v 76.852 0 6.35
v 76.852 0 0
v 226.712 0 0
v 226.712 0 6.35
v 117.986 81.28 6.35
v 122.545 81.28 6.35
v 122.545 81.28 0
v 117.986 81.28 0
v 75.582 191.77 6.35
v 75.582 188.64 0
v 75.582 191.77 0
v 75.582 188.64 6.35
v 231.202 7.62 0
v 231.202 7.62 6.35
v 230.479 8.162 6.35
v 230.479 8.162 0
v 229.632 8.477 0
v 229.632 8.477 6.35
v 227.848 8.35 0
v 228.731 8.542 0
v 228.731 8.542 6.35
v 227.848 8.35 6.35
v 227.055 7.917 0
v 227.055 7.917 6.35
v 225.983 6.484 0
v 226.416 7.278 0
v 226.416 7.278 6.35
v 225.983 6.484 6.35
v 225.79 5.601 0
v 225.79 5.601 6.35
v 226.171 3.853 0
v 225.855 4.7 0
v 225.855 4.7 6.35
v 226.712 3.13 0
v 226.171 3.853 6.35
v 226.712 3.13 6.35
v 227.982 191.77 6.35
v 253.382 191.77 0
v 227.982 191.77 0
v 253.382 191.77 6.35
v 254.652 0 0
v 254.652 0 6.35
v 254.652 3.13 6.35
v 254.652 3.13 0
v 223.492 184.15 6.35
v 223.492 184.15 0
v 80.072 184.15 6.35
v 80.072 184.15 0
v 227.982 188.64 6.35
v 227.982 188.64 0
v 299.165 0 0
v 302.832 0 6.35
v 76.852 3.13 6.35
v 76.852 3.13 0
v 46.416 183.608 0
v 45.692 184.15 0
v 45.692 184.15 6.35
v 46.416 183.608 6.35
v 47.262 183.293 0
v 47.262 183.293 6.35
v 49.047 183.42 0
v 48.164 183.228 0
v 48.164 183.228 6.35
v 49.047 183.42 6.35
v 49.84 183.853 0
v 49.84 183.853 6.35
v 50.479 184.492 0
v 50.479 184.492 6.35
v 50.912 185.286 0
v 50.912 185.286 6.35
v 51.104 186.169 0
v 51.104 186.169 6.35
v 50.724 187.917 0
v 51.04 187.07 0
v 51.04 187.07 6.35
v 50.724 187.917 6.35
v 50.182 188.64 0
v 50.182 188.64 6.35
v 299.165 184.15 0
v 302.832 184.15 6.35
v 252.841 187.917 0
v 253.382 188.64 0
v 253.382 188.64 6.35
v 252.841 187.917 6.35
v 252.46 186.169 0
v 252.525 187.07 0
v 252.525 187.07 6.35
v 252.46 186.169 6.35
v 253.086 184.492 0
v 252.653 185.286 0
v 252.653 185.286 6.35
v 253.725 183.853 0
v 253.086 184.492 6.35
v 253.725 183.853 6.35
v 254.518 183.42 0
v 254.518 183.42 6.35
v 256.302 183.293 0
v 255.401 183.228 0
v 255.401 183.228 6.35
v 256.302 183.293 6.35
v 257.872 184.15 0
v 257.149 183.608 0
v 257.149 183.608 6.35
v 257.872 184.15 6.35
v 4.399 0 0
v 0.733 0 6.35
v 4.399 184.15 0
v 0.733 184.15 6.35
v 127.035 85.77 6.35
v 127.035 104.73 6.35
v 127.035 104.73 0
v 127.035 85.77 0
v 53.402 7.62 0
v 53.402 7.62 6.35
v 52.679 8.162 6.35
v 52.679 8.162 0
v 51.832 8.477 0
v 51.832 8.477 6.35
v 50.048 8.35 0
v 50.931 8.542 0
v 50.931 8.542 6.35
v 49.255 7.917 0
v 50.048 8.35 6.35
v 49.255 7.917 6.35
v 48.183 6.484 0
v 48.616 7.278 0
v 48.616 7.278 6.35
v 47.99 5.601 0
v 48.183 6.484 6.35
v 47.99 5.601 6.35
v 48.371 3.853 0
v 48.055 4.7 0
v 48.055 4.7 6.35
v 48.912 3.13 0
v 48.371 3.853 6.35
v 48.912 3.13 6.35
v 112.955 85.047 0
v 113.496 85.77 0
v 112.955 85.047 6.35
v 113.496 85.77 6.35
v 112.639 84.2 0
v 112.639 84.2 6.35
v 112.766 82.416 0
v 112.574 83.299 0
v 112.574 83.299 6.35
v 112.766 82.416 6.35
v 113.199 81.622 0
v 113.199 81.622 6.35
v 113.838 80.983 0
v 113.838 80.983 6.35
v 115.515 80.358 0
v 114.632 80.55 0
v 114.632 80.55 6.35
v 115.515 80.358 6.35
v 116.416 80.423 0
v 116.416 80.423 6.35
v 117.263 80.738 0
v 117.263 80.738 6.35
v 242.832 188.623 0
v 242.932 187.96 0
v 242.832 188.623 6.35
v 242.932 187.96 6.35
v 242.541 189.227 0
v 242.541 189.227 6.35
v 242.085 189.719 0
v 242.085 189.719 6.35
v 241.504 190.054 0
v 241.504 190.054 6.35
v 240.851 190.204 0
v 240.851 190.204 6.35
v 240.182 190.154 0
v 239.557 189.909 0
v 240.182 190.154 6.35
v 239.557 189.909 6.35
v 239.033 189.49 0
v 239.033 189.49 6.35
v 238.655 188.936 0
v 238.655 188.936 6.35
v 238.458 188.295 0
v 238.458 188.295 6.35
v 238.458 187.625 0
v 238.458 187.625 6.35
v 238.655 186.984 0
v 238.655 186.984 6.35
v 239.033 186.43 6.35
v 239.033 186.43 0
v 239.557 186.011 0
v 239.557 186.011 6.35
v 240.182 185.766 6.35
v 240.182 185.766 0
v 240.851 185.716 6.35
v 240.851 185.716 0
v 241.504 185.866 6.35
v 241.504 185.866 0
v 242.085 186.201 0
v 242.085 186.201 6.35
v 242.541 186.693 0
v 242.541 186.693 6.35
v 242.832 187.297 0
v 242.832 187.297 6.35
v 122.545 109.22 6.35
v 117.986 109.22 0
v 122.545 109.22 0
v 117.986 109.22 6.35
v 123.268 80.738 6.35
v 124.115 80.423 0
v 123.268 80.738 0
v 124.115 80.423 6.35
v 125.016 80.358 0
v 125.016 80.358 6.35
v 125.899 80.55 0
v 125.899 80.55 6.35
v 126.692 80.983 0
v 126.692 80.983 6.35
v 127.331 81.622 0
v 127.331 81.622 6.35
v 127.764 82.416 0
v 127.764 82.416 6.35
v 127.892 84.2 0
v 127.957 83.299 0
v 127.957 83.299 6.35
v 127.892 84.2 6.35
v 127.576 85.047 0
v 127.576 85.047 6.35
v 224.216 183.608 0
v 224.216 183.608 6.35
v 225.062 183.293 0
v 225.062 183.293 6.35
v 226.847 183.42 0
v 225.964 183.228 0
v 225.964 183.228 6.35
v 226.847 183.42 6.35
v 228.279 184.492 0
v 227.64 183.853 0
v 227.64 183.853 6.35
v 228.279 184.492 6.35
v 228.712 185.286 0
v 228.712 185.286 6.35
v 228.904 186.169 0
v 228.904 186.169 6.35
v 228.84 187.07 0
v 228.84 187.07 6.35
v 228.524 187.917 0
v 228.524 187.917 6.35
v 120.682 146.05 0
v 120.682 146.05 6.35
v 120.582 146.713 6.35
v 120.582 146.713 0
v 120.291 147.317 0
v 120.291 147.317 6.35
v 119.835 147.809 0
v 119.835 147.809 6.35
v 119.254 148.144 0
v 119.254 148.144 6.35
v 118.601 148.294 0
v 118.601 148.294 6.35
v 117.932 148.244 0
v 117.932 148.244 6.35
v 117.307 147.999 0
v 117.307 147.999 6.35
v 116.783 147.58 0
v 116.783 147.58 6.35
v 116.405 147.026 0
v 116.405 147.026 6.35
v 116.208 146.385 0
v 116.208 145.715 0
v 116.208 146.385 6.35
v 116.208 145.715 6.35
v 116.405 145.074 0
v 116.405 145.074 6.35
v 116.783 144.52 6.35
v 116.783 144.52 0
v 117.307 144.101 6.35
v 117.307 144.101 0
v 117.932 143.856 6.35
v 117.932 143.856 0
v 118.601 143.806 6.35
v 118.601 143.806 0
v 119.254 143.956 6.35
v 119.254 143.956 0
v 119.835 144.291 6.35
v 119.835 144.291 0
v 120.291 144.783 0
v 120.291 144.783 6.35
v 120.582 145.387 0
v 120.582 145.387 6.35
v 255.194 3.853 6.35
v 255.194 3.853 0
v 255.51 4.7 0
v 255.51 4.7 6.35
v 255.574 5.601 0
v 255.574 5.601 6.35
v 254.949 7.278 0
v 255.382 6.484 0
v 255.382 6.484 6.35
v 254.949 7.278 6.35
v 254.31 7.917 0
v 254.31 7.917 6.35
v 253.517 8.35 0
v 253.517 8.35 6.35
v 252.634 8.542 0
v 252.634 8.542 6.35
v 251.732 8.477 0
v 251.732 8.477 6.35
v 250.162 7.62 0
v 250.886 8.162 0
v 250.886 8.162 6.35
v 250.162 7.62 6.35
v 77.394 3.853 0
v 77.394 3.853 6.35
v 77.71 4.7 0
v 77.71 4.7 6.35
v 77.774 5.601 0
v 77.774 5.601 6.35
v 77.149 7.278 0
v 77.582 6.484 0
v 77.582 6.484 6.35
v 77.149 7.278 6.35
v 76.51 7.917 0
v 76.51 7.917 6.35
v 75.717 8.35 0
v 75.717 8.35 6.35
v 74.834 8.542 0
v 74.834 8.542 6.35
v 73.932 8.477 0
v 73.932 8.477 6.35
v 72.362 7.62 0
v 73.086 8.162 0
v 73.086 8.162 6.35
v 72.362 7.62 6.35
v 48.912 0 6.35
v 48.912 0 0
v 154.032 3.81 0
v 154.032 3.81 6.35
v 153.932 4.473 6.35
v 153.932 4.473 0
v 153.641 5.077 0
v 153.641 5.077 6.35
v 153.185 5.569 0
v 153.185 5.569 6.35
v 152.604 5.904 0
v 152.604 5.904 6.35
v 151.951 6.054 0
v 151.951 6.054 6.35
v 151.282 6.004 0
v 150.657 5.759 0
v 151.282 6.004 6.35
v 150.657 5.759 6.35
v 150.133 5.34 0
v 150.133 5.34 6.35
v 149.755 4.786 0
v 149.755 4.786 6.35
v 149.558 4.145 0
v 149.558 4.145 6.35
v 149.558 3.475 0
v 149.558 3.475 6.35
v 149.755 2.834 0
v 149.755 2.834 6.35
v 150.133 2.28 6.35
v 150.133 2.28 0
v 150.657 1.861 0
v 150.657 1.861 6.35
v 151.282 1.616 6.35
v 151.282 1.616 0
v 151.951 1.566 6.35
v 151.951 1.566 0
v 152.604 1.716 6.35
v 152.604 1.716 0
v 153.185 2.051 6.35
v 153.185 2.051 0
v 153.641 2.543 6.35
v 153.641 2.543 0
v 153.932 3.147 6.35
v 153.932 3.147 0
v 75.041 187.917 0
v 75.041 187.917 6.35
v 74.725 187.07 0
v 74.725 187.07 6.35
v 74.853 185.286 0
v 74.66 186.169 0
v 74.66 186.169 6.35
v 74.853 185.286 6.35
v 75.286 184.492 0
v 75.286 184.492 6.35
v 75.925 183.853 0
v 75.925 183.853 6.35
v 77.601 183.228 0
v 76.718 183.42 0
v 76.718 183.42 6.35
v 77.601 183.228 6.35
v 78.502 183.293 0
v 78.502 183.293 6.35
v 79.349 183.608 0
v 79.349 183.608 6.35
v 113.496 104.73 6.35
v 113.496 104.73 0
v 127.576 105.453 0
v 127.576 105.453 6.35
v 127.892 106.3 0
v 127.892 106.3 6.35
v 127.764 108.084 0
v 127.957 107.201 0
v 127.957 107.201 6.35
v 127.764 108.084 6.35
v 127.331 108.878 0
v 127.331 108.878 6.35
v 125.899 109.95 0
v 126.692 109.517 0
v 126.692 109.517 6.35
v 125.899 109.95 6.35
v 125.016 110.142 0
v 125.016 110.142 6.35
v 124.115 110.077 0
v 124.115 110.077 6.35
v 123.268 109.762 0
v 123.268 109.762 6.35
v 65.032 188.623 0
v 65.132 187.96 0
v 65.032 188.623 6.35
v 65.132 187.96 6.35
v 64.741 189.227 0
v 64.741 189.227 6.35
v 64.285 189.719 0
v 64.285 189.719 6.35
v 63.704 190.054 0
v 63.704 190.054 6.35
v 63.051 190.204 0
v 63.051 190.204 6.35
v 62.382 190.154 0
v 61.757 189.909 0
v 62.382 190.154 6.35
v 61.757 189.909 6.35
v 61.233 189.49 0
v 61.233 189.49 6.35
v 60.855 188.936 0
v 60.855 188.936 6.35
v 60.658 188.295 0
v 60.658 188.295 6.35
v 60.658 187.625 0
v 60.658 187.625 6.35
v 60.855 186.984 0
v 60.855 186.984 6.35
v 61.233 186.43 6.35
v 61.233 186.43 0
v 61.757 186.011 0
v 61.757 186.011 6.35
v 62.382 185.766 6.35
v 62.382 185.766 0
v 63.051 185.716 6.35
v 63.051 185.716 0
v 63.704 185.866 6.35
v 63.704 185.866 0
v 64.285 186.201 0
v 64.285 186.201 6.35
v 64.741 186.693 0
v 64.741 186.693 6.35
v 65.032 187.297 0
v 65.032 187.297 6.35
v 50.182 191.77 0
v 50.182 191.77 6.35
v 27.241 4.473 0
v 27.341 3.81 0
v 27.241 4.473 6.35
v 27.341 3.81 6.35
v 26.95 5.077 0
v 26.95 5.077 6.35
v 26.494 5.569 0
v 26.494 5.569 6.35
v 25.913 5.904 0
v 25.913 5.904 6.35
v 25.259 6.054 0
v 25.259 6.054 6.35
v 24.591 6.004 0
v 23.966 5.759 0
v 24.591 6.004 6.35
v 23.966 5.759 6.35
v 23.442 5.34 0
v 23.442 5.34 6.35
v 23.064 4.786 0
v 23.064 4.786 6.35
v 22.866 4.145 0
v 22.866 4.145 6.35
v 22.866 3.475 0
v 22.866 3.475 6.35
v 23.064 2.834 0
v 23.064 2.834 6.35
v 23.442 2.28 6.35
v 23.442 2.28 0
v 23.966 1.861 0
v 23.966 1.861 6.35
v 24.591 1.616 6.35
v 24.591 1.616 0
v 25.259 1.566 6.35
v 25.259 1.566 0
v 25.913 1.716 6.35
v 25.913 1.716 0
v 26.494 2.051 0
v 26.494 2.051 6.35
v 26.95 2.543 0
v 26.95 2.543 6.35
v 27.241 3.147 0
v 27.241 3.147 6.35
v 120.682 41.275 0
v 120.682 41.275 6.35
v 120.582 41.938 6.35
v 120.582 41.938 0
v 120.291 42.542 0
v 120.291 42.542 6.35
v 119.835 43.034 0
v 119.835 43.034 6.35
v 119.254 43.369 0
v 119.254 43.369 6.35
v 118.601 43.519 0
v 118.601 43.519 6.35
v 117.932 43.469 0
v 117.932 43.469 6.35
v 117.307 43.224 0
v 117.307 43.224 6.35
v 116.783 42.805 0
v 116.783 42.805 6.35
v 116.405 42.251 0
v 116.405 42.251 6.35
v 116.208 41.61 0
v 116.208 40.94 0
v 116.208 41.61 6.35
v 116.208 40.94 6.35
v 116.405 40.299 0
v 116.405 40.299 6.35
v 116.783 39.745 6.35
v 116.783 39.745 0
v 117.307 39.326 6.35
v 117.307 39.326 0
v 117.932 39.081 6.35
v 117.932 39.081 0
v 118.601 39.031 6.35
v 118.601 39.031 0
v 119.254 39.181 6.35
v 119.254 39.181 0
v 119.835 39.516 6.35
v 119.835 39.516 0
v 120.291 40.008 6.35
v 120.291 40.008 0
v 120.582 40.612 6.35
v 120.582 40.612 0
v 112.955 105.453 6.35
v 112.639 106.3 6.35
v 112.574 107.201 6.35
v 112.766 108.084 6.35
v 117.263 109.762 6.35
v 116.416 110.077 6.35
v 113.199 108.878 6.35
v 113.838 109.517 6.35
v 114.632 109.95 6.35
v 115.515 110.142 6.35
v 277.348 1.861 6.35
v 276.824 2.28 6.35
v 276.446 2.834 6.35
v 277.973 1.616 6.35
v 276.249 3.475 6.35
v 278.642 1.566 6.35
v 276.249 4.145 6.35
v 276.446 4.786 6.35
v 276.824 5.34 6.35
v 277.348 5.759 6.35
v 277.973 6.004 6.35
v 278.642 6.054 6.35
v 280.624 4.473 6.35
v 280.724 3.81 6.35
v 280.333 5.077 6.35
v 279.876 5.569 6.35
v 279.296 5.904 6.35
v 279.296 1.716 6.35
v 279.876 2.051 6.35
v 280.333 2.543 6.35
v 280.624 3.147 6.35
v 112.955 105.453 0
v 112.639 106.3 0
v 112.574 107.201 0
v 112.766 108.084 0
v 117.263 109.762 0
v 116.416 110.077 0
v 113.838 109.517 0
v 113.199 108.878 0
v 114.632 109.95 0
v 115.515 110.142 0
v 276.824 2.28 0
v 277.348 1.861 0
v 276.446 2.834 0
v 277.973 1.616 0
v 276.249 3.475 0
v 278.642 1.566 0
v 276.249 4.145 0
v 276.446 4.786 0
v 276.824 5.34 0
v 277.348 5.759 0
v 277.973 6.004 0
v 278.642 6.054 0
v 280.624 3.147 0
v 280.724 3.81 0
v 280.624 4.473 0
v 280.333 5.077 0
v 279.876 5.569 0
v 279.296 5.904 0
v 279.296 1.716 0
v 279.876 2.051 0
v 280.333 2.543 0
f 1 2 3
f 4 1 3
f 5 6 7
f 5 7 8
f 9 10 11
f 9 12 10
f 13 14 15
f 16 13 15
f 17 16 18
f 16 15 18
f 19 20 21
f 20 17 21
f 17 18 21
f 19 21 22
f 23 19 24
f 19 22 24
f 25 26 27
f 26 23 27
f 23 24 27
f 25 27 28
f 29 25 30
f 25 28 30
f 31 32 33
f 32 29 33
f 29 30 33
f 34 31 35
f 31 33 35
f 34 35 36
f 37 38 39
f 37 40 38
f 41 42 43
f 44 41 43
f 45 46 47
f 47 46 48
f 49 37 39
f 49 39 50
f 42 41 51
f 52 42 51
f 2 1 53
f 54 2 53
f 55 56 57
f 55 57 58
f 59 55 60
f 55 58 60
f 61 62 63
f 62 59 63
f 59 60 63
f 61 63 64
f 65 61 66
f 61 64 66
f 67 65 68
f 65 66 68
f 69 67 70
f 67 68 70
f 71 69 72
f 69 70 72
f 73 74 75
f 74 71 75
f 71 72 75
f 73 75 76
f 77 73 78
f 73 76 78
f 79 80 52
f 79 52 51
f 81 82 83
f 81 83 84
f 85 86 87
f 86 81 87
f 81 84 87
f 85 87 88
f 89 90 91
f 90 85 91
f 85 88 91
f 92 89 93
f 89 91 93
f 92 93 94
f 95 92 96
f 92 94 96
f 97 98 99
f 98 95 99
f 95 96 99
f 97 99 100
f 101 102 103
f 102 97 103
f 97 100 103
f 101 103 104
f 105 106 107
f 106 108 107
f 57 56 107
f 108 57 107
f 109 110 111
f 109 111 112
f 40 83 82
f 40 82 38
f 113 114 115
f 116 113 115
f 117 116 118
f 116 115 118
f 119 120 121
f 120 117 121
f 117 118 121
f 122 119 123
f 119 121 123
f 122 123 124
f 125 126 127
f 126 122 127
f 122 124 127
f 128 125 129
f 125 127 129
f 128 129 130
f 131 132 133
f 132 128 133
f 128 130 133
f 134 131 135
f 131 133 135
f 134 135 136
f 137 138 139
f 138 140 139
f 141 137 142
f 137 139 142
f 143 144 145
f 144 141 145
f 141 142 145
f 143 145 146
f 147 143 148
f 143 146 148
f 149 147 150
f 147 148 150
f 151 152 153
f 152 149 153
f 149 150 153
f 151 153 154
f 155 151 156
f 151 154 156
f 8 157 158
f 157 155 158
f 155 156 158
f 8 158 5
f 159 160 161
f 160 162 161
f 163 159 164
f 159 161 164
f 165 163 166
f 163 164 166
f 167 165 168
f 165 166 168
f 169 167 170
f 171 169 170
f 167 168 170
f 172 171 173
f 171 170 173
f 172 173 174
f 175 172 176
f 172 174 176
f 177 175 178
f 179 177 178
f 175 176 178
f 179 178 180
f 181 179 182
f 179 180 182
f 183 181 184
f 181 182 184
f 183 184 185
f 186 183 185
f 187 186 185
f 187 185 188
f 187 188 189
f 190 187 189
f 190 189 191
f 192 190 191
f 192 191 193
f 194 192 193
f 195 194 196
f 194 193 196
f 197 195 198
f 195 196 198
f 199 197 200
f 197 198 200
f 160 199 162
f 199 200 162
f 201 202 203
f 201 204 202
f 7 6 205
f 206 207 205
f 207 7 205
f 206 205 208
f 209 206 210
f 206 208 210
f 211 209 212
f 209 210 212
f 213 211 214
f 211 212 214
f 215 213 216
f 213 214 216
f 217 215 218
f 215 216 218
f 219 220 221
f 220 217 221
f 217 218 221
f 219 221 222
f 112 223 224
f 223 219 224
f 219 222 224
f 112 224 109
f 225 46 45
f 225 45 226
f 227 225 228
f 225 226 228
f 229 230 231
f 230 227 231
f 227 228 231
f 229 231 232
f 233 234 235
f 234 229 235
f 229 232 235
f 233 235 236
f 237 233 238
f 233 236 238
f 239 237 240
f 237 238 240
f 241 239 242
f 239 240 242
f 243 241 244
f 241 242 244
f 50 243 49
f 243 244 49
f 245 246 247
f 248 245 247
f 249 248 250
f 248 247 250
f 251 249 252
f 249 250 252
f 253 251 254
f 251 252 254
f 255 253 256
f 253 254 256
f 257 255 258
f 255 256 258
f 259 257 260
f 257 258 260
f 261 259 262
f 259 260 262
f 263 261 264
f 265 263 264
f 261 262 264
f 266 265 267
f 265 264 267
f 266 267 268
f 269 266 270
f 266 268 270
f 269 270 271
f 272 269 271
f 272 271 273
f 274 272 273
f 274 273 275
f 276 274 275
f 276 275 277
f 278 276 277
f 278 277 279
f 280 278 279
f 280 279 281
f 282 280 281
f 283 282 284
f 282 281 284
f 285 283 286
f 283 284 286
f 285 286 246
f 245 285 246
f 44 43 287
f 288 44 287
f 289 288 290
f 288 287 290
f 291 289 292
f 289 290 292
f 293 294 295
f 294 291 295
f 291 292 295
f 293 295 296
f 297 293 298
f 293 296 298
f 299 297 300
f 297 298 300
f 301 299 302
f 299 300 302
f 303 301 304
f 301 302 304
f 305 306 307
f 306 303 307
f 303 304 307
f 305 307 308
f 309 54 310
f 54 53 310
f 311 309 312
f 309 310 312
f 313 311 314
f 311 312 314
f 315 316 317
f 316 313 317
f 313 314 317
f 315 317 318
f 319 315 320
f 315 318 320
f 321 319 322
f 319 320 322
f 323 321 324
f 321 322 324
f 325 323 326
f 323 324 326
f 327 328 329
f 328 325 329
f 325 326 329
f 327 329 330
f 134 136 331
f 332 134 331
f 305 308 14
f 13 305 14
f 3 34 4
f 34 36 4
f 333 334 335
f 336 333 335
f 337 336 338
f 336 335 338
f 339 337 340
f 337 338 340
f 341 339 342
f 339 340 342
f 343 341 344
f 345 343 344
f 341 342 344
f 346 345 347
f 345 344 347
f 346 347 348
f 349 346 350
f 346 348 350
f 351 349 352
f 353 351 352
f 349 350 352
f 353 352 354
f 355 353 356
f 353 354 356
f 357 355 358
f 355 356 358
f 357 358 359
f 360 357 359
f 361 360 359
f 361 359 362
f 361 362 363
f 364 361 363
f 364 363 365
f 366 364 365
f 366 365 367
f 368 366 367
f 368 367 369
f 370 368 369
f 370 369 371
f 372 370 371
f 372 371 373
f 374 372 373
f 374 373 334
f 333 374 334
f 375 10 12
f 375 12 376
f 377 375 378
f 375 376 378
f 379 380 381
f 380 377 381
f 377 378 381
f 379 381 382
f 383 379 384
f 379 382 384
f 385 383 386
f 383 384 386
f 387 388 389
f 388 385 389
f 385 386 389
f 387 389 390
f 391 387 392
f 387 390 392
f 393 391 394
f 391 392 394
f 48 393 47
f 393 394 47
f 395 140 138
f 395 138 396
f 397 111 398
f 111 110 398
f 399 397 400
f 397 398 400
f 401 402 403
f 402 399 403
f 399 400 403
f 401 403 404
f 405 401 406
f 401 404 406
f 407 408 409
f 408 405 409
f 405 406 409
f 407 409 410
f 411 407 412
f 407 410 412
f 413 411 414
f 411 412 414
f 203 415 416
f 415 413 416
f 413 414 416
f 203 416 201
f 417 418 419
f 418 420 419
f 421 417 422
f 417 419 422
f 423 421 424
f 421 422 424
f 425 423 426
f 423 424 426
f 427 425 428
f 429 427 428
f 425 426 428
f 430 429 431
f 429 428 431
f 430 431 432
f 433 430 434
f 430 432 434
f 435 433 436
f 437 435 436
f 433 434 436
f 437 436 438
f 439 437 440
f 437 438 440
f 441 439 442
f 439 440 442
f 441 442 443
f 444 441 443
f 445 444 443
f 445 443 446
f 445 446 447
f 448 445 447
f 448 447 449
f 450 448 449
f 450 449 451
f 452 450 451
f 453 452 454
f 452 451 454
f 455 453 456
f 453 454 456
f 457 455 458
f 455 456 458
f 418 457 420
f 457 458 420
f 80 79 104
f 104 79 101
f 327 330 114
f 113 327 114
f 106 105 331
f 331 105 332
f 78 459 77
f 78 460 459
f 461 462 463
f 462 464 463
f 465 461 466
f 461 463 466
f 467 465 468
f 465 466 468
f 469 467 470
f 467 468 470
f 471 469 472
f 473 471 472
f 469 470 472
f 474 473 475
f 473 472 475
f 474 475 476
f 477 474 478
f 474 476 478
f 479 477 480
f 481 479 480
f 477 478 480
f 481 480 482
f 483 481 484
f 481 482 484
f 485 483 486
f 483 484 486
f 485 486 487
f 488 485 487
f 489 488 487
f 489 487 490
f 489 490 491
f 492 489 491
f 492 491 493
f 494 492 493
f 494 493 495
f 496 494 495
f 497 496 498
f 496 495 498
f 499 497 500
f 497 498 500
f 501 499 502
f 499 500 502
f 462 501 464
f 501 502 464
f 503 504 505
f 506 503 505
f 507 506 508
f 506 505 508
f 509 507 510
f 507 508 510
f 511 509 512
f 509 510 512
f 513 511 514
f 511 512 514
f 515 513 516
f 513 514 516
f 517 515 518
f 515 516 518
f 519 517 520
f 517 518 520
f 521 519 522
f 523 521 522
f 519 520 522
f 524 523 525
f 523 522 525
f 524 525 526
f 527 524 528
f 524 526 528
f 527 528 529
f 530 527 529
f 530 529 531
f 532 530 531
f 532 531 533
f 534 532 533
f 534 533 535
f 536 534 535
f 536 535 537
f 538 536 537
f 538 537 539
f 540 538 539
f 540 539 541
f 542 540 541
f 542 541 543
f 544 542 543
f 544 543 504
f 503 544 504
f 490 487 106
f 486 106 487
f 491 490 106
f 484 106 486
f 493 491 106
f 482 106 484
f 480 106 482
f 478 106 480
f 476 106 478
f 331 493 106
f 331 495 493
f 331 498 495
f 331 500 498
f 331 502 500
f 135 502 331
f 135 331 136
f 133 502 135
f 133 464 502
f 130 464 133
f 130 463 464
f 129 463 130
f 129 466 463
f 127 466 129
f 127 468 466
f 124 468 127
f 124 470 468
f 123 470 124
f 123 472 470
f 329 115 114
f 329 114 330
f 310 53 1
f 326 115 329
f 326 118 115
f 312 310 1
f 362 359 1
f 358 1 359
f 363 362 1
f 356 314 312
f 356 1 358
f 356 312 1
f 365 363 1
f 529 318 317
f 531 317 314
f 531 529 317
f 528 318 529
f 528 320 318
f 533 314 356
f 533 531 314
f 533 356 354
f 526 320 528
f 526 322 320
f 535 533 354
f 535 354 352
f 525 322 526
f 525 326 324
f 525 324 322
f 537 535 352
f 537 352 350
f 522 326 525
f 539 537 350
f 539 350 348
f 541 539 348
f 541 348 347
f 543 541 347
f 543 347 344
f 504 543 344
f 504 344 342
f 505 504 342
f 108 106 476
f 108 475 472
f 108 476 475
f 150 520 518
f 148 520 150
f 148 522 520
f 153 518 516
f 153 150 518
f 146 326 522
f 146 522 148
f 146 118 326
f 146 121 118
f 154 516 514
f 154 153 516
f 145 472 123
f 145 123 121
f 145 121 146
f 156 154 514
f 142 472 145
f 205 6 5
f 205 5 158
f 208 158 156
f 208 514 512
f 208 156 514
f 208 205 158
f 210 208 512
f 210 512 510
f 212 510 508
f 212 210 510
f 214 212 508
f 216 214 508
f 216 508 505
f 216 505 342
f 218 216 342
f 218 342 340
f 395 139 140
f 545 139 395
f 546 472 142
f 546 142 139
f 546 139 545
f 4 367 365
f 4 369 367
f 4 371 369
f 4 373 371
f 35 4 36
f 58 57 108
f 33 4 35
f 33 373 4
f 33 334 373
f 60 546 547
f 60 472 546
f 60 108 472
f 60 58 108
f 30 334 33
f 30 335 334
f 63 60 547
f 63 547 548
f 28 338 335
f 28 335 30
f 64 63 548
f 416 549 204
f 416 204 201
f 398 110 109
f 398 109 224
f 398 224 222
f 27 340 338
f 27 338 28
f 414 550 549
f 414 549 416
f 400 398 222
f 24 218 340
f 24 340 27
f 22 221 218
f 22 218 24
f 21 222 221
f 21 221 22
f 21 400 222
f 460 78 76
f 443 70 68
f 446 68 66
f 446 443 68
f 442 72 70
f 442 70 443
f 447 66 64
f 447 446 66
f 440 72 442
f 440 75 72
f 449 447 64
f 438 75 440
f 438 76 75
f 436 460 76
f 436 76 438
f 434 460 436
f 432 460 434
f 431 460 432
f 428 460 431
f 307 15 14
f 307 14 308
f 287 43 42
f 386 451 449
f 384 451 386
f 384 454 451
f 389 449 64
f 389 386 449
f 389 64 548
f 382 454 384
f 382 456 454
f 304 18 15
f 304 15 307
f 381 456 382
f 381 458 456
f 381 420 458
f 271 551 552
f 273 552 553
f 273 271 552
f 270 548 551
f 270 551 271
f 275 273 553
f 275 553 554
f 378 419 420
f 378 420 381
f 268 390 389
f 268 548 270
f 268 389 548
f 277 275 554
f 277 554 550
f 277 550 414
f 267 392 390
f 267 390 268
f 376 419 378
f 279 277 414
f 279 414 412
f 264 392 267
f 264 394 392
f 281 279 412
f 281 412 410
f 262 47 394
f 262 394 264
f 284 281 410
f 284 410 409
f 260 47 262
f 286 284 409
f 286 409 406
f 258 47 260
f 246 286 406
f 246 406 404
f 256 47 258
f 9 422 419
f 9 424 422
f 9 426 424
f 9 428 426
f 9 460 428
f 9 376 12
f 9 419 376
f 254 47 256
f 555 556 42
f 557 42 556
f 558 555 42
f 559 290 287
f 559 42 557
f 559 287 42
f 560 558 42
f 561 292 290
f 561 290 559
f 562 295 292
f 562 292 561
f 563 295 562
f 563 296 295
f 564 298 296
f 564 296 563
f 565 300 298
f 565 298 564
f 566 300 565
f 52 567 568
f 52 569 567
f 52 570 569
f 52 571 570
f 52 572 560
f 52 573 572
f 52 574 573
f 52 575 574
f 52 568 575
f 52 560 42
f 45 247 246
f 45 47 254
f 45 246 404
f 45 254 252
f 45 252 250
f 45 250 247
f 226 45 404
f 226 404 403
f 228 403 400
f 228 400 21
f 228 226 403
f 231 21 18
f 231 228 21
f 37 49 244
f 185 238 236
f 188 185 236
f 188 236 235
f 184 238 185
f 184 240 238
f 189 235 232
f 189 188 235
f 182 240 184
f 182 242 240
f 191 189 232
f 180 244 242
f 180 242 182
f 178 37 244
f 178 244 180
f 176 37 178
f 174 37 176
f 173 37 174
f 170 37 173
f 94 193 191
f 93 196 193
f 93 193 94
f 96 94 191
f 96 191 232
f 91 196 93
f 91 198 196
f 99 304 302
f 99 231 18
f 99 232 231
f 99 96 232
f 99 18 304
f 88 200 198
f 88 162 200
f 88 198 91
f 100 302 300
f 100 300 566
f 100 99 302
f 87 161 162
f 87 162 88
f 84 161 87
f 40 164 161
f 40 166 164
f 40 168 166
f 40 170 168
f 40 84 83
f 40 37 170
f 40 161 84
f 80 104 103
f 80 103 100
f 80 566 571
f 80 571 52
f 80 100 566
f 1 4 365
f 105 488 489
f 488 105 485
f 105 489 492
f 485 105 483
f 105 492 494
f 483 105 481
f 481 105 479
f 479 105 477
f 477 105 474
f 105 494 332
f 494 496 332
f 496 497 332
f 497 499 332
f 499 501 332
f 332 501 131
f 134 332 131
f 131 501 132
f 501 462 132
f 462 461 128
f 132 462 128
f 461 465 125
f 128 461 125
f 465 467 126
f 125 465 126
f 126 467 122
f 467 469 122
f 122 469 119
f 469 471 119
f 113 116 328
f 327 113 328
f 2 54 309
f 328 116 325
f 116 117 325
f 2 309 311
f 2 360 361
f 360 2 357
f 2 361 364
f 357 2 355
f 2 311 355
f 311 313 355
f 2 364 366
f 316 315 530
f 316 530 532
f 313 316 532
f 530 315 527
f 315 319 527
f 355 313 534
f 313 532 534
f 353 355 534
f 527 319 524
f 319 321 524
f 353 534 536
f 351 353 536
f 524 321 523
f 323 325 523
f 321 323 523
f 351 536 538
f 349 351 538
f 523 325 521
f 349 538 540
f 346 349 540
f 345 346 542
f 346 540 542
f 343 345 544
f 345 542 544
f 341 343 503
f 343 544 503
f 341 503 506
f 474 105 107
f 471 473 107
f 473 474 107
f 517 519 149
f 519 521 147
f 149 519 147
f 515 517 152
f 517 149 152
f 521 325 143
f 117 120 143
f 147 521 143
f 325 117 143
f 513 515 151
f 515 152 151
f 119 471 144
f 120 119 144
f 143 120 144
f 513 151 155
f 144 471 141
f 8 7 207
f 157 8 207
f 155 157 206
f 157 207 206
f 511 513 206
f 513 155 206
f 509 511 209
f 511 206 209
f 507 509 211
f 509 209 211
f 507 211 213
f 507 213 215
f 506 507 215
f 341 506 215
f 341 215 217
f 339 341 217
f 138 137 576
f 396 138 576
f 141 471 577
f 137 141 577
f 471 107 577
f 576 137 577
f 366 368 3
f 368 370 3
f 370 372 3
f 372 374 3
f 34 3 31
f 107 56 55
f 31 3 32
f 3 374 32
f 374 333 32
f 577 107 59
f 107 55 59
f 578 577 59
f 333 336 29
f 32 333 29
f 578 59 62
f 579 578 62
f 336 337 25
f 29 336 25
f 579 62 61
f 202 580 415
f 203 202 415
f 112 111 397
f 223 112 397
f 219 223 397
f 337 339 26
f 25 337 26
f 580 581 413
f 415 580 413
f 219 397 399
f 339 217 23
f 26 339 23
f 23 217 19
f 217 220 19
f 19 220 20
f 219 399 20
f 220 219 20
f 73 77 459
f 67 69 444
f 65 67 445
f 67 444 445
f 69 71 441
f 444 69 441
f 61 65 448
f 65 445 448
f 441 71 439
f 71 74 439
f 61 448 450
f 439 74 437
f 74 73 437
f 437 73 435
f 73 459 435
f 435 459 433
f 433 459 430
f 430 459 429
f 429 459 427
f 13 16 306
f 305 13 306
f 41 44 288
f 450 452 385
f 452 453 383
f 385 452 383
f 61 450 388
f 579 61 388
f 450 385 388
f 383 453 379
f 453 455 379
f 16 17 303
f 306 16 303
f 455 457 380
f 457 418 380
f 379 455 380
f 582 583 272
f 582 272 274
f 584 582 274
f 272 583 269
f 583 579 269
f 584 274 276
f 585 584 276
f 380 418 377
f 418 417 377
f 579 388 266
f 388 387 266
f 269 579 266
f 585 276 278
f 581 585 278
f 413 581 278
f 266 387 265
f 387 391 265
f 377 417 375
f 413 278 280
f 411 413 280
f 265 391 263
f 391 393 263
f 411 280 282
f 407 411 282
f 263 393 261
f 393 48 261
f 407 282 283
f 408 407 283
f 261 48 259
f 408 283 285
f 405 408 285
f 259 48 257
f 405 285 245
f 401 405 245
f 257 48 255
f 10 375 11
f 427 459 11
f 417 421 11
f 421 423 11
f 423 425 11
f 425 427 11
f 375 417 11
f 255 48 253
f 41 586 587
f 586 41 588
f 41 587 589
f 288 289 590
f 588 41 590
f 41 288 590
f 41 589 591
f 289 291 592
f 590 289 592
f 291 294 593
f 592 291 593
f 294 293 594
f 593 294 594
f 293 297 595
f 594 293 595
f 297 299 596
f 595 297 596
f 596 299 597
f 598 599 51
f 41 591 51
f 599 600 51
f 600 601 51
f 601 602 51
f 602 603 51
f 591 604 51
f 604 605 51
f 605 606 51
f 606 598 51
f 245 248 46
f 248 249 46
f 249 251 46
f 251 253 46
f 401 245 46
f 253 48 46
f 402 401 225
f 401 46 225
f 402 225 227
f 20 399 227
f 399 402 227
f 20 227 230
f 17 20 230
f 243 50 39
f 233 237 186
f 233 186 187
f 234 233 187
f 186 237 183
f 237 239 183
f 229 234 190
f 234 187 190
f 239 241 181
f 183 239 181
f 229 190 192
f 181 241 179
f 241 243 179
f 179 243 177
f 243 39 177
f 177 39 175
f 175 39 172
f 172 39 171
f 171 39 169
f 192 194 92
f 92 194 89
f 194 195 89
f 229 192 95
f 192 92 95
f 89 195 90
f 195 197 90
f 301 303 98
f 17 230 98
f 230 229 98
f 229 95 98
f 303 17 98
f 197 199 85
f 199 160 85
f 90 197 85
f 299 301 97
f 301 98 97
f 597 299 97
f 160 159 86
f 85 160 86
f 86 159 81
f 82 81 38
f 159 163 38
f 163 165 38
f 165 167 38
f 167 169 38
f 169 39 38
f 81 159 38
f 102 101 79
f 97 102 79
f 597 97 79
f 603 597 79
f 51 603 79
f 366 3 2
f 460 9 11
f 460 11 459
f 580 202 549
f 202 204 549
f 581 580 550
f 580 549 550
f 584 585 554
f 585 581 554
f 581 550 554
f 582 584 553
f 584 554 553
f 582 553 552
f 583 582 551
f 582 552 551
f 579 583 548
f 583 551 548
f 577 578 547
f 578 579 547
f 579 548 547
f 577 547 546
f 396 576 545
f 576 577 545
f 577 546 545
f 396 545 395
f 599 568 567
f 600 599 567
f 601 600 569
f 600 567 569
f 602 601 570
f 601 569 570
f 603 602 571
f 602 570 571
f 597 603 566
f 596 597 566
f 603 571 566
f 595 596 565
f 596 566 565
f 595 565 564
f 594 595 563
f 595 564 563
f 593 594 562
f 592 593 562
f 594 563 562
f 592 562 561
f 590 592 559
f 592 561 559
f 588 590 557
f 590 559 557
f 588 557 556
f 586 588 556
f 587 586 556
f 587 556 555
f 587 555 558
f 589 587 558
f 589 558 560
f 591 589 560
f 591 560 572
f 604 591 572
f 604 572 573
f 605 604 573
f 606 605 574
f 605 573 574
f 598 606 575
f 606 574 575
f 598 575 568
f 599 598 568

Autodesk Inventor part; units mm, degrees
ref_plane "YZ Plane" through (0, 0, 0) normal (1, 0, 0) x (0, 1, 0)
sketch "Sketch1" plane through (0, 0, 0) normal (0, 0, 1) x (1, 0, 0)
  line L0 (0, 0) -> (303.5647, 0)
  line L1 (303.5647, 0) -> (303.5647, 184.15)
  line L2 (303.5647, 184.15) -> (0, 184.15)
  line L3 (0, 184.15) -> (0, 0)
  dimension "d0" = 303.5647
  dimension "d1" = 184.15
extrude "Extrusion1" add sketch "Sketch1" along normal blind 6.35
sketch "Sketch2" plane through (0, 184.15, 0) normal (0, 1, 0) x (1, 0, 0)
  line L0 (0, -6.35) -> (303.5647, -6.35) projected
  line L1 (0, -6.35) -> (3.6662, 0)
  line L2 (3.6662, 0) -> (0, 0)
  line L3 (0, 0) -> (0, -6.35)
  line L4 (0, 0) -> (303.5647, 0) projected
  line L5 (303.5647, 0) -> (303.5647, -6.35) projected
  line L6 (299.8985, 0) -> (303.5647, -6.35)
  line L7 (303.5647, -6.35) -> (303.5647, 0)
  line L8 (303.5647, 0) -> (299.8985, 0)
  dimension "d4" = 30
  dimension "d5" = 30
extrude "Extrusion2" cut sketch "Sketch2" against normal through all contours L3 L2 L1 | L6 L4 L5
ref_plane "Work Plane1" through (3.6662, 92.075, 0) normal (0, -1, 0) x (1, 0, 0)
sketch "Sketch4" plane through (3.6662, 92.075, 0) normal (0, -1, 0) x (1, 0, 0)
  line L0 (0, 0) -> (296.2324, 0) projected
  line L1 (118.4324, 0) -> (129.4309, 6.35) construction
  line L2 (129.4309, 6.35) -> (116.7309, 6.35) construction
  line L3 (-3.6662, 6.35) -> (299.8985, 6.35) projected
  line L4 (118.4324, 0) -> (111.1, 0)
  line L5 (118.0728, 4.0257) -> (111.1, 0) construction
  line L6 (-3.6662, 6.35) -> (0, 0) projected
  line L7 (118.4324, 0) -> (122.0985, 6.35)
  line L8 (111.1, 0) -> (114.7662, 6.35)
  line L9 (122.0985, 6.35) -> (114.7662, 6.35)
  point P0 (-3.6662, 0)
  dimension "d13" = 88.9
  dimension "d14" = 30
  dimension "d15" = 60
  dimension "d16" = 6.35
extrude "Extrusion3" cut sketch "Sketch4" along normal blind 9.525 and the other way blind 15.875 contours L8 L3 L7 L0
sketch "Sketch5" plane through (0, 0, 6.35) normal (0, 0, 1) x (1, 0, 0)
  line L0 (3.6662, 0) -> (299.8985, 0) projected
  line L1 (50.1824, 0) -> (75.5824, 0)
  line L2 (75.5824, 0) -> (75.5824, 7.62)
  line L3 (75.5824, 7.62) -> (50.1824, 7.62)
  line L4 (50.1824, 7.62) -> (50.1824, 0)
  line L5 (227.9824, 0) -> (253.3824, 0)
  line L6 (253.3824, 0) -> (253.3824, 7.62)
  line L7 (253.3824, 7.62) -> (227.9824, 7.62)
  line L8 (227.9824, 7.62) -> (227.9824, 0)
  line L9 (75.5824, 7.62) -> (227.9824, 7.62) construction
  point P0 (0, 0)
  point P1 (151.7824, 7.62)
  point P2 (151.7824, 0)
  dimension "d19" = 25.4
  dimension "d20" = 7.62
  dimension "d21" = 25.4
  dimension "d22" = 7.62
  dimension "d23" = 152.4
extrude "Extrusion4" cut sketch "Sketch5" against normal through all
sketch "Sketch6" plane through (0, 0, 6.35) normal (0, 0, 1) x (1, 0, 0)
  line L0 (299.8985, 184.15) -> (3.6662, 184.15) projected
  line L1 (50.1824, 184.15) -> (75.5824, 184.15)
  line L2 (75.5824, 184.15) -> (75.5824, 191.77)
  line L3 (75.5824, 191.77) -> (50.1824, 191.77)
  line L4 (50.1824, 191.77) -> (50.1824, 184.15)
  line L5 (50.1824, 7.62) -> (75.5824, 7.62) projected
  line L6 (227.9824, 184.15) -> (253.3824, 184.15)
  line L7 (253.3824, 184.15) -> (253.3824, 191.77)
  line L8 (253.3824, 191.77) -> (227.9824, 191.77)
  line L9 (227.9824, 191.77) -> (227.9824, 184.15)
  line L10 (227.9824, 7.62) -> (253.3824, 7.62) projected
  point P0 (0, 0)
  point P1 (62.8824, 191.77)
  point P2 (62.8824, 7.62)
  point P3 (240.6824, 191.77)
  point P4 (240.6824, 7.62)
  dimension "d26" = 25.4
  dimension "d27" = 7.62
  dimension "d28" = 25.4
  dimension "d29" = 7.62
extrude "Extrusion5" add sketch "Sketch6" against normal blind 6.35
ref_plane "Work Plane2" through (125.7647, 92.075, 6.35) normal (-0.5, 0, -0.8660254) x (0, -1, 0)
sketch "Sketch7" plane through (125.7647, 92.075, 6.35) normal (-0.5, 0, -0.8660254) x (0, -1, 0)
  line L0 (-15.875, 6.35) -> (-15.875, 0) projected
  line L1 (-15.875, 3.175) -> (-92.075, 3.175) construction
  line L2 (-92.075, -88.5231) -> (-92.075, 43.4592) projected
  line L3 (9.525, 0) -> (9.525, 6.35) projected
  line L4 (9.525, 3.175) -> (92.075, 3.175) construction
  line L5 (92.075, 43.4592) -> (92.075, -88.5231) projected
  circle A0 centre (-53.975, 3.175) radius 2.25
  circle A1 centre (50.8, 3.175) radius 2.25
  point P0 (92.075, 105.7404)
  dimension "d33" = 4.5
  dimension "d34" = 4.5
extrude "Extrusion6" cut sketch "Sketch7" along normal through all
sketch "Sketch8" plane through (0, 0, 6.35) normal (0, 0, 1) x (1, 0, 0)
  circle A0 centre (62.8824, 187.96) radius 2.25
  circle A1 centre (240.6824, 187.96) radius 2.25
  circle A2 centre (278.4735, 3.81) radius 2.25
  circle A3 centre (151.7824, 3.81) radius 2.25
  circle A4 centre (25.0912, 3.81) radius 2.25
  line L0 (0, 0) -> (50.1824, 0) projected
  line L1 (75.5824, 0) -> (227.9824, 0) projected
  line L2 (253.3824, 0) -> (303.5647, 0) projected
  line L3 (50.1824, 0) -> (50.1824, 7.62) projected
  line L4 (253.3824, 184.15) -> (253.3824, 191.77) projected
  line L5 (75.5824, 191.77) -> (50.1824, 191.77) projected
  line L6 (253.3824, 191.77) -> (227.9824, 191.77) projected
  point P0 (25.0912, 0)
  point P1 (151.7824, 0)
  point P2 (278.4735, 0)
  point P3 (50.1824, 3.81)
  point P4 (253.3824, 187.96)
  point P5 (62.8824, 191.77)
  point P6 (240.6824, 191.77)
  dimension "d37" = 4.5
  dimension "d38" = 4.5
  dimension "d39" = 4.5
  dimension "d40" = 4.5
  dimension "d41" = 4.5
extrude "Extrusion7" cut sketch "Sketch8" against normal through all
sketch "Sketch9" plane through (0, 0, 0) normal (0, 0, -1) x (-1, 0, 0)
  ellipse E0 centre (-118.4324, 41.275) end of major axis (-121.0304, 41.275) minor radius 2.25 projected
  line L0 (-114.7662, 107.95) -> (-114.7662, 82.55) projected
  line L1 (-114.7662, 107.95) -> (-118.4324, 107.95) projected
  line L2 (-118.4324, 82.55) -> (-118.4324, 107.95) projected
  line L3 (-118.4324, 82.55) -> (-114.7662, 82.55) projected
  ellipse E1 centre (-118.4324, 146.05) end of major axis (-121.0304, 146.05) minor radius 2.25 projected
  point P0 (0, 0)
extrude "Extrusion8" cut sketch "Sketch9" along normal through all both and the other way through all
sketch "Sketch10" plane through (0, 0, 6.35) normal (0, 0, 1) x (1, 0, 0)
  ellipse E0 centre (118.4324, 146.05) end of major axis (115.8343, 146.05) minor radius 2.25 (118.4324, 143.8) -> (120.2654, 144.4555) ccw projected
  ellipse E1 centre (122.0985, 146.05) end of major axis (124.6966, 146.05) minor radius 2.25 (120.2654, 144.4555) -> (120.2654, 147.6445) ccw projected
  ellipse E2 centre (118.4324, 146.05) end of major axis (115.8343, 146.05) minor radius 2.25 (120.2654, 147.6445) -> (118.4324, 148.3) ccw projected
  ellipse E3 centre (118.4324, 146.05) end of major axis (121.0304, 146.05) minor radius 2.25 (118.4324, 143.8) -> (118.4324, 148.3) ccw projected
  ellipse E4 centre (118.4324, 41.275) end of major axis (115.8343, 41.275) minor radius 2.25 (118.4324, 39.025) -> (120.2654, 39.6805) ccw projected
  ellipse E5 centre (122.0985, 41.275) end of major axis (124.6966, 41.275) minor radius 2.25 (120.2654, 39.6805) -> (120.2654, 42.8695) ccw projected
  ellipse E6 centre (118.4324, 41.275) end of major axis (115.8343, 41.275) minor radius 2.25 (120.2654, 42.8695) -> (118.4324, 43.525) ccw projected
  ellipse E7 centre (118.4324, 41.275) end of major axis (121.0304, 41.275) minor radius 2.25 (118.4324, 39.025) -> (118.4324, 43.525) ccw projected
  line L0 (125.7647, 107.95) -> (125.7647, 82.55) projected
  line L1 (125.7647, 107.95) -> (122.0985, 107.95) projected
  line L2 (122.0985, 82.55) -> (122.0985, 107.95) projected
  line L3 (122.0985, 82.55) -> (125.7647, 82.55) projected
  point P0 (0, 0)
extrude "Extrusion9" cut sketch "Sketch10" against normal through all contours L0 L3 L2 L1
sketch "Sketch11" plane through (0, 0, 6.35) normal (0, 0, 1) x (1, 0, 0)
  ellipse E0 centre (118.4324, 146.05) end of major axis (115.8343, 146.05) minor radius 2.25 (120.2654, 147.6445) -> (120.2654, 144.4555) ccw projected
  ellipse E1 centre (118.4324, 41.275) end of major axis (115.8343, 41.275) minor radius 2.25 (120.2654, 42.8695) -> (120.2654, 39.6805) ccw projected
  circle A0 centre (118.4324, 41.275) radius 2.25
  circle A1 centre (118.4324, 146.05) radius 2.25
  circle A2 centre (118.4324, 146.05) radius 7.5
  circle A3 centre (118.4324, 41.275) radius 7.5
  point P0 (0, 0)
  dimension "d48" = 4.5
  dimension "d49" = 4.5
  dimension "d50" = 15
  dimension "d51" = 15
extrude "Extrusion10" add sketch "Sketch11" against normal up to surface (6.35 mm away) from surface at 0 contours A1 E0 | A0 E1 | A2 | A3
sketch "Sketch12" plane through (0, 0, 6.35) normal (0, 0, 1) x (1, 0, 0)
  line L0 (3.6662, 0) -> (50.1824, 0) projected
  line L1 (48.9124, 0) -> (76.8524, 0)
  line L2 (76.8524, 0) -> (76.8524, 7.62)
  line L3 (76.8524, 7.62) -> (48.9124, 7.62)
  line L4 (48.9124, 7.62) -> (48.9124, 0)
  line L5 (75.5824, 0) -> (227.9824, 0) projected
  line L6 (226.7124, 0) -> (254.6524, 0)
  line L7 (254.6524, 0) -> (254.6524, 7.62)
  line L8 (254.6524, 7.62) -> (226.7124, 7.62)
  line L9 (226.7124, 7.62) -> (226.7124, 0)
  line L10 (50.1824, 7.62) -> (75.5824, 7.62) projected
  line L11 (227.9824, 7.62) -> (253.3824, 7.62) projected
  line L12 (50.1824, 0) -> (50.1824, 7.62) projected
  line L13 (227.9824, 0) -> (227.9824, 7.62) projected
  line L14 (114.7662, 107.95) -> (125.7647, 107.95) projected
  line L15 (114.7662, 82.55) -> (114.7662, 107.95) projected
  line L16 (125.7647, 82.55) -> (114.7662, 82.55) projected
  line L17 (125.7647, 107.95) -> (125.7647, 82.55) projected
  line L18 (113.4962, 109.22) -> (127.0347, 109.22)
  line L19 (127.0347, 109.22) -> (127.0347, 81.28)
  line L20 (127.0347, 81.28) -> (113.4962, 81.28)
  line L21 (113.4962, 81.28) -> (113.4962, 109.22)
  point P0 (0, 0)
  point P1 (62.8824, 7.62)
  point P2 (240.6824, 7.62)
  dimension "d54" = 1.27
  dimension "d55" = 1.27
  dimension "d56" = 1.27
extrude "Extrusion11" cut sketch "Sketch12" against normal through all contours L4 L3 L12 L0 | L12 L3 L2 L1 | L9 L8 L13 L5 | L13 L8 L7 L6 | L14 L17 L16 L15 | L18 L19 L20 L21
sketch "Sketch13" plane through (0, 0, 6.35) normal (0, 0, 1) x (1, 0, 0)
  line L0 (254.6524, 7.62) -> (254.6524, 0) construction
  line L1 (254.6524, 0) -> (303.5647, 0) construction
  line L2 (303.5647, 0) -> (303.5647, 184.15) construction
  line L3 (303.5647, 184.15) -> (253.3824, 184.15) construction
  line L4 (253.3824, 184.15) -> (253.3824, 191.77) construction
  line L5 (253.3824, 191.77) -> (227.9824, 191.77) construction
  line L6 (227.9824, 191.77) -> (227.9824, 184.15) construction
  line L7 (227.9824, 184.15) -> (75.5824, 184.15) construction
  line L8 (75.5824, 184.15) -> (75.5824, 191.77) construction
  line L9 (75.5824, 191.77) -> (50.1824, 191.77) construction
  line L10 (50.1824, 191.77) -> (50.1824, 184.15) construction
  line L11 (50.1824, 184.15) -> (0, 184.15) construction
  line L12 (0, 184.15) -> (0, 0) construction
  line L13 (0, 0) -> (48.9124, 0) construction
  line L14 (48.9124, 0) -> (48.9124, 7.62) construction
  line L15 (48.9124, 7.62) -> (76.8524, 7.62) construction
  line L16 (76.8524, 7.62) -> (76.8524, 0) construction
  line L17 (76.8524, 0) -> (226.7124, 0) construction
  line L18 (226.7124, 0) -> (226.7124, 7.62) construction
  line L19 (226.7124, 7.62) -> (254.6524, 7.62) construction
  line L20 (113.4962, 81.28) -> (113.4962, 109.22) construction
  line L21 (113.4962, 109.22) -> (127.0347, 109.22) construction
  line L22 (127.0347, 109.22) -> (127.0347, 81.28) construction
  line L23 (127.0347, 81.28) -> (113.4962, 81.28) construction
  circle A0 centre (118.4324, 146.05) radius 2.25 construction
  circle A1 centre (118.4324, 41.275) radius 2.25 construction
  circle A2 centre (25.0912, 3.81) radius 2.25 construction
  circle A3 centre (278.4735, 3.81) radius 2.25 construction
  circle A4 centre (62.8824, 187.96) radius 2.25 construction
  circle A5 centre (240.6824, 187.96) radius 2.25 construction
  circle A6 centre (151.7824, 3.81) radius 2.25 construction
  line L24 (77.8274, 186.3951) -> (225.7373, 186.3951) construction
  line L25 (225.7373, 186.3951) -> (225.7373, 194.0151) construction
  line L26 (225.7373, 194.0151) -> (255.6274, 194.0151) construction
  line L27 (255.6274, 194.0151) -> (255.6274, 186.3951) construction
  line L28 (255.6274, 186.3951) -> (305.8098, 186.3951) construction
  line L29 (305.8098, 186.3951) -> (305.8098, -2.2451) construction
  line L30 (305.8098, -2.2451) -> (252.4073, -2.2451) construction
  line L31 (252.4073, -2.2451) -> (252.4073, 5.3749) construction
  line L32 (252.4073, 5.3749) -> (228.9574, 5.3749) construction
  line L33 (228.9574, 5.3749) -> (228.9574, -2.2451) construction
  line L34 (228.9574, -2.2451) -> (74.6073, -2.2451) construction
  line L35 (74.6073, -2.2451) -> (74.6073, 5.3749) construction
  line L36 (74.6073, 5.3749) -> (51.1574, 5.3749) construction
  line L37 (51.1574, 5.3749) -> (51.1574, -2.2451) construction
  line L38 (51.1574, -2.2451) -> (-2.2451, -2.2451) construction
  line L39 (-2.2451, -2.2451) -> (-2.2451, 186.3951) construction
  line L40 (-2.2451, 186.3951) -> (47.9373, 186.3951) construction
  line L41 (47.9373, 186.3951) -> (47.9373, 194.0151) construction
  line L42 (47.9373, 194.0151) -> (77.8274, 194.0151) construction
  line L43 (77.8274, 194.0151) -> (77.8274, 186.3951) construction
  circle A7 centre (47.9373, 186.3951) radius 3.175
  circle A8 centre (77.8274, 186.3951) radius 3.175
  circle A9 centre (225.7373, 186.3951) radius 3.175
  circle A10 centre (255.6274, 186.3951) radius 3.175
  circle A11 centre (252.4073, 5.3749) radius 3.175
  line L44 (226.7124, 7.62) -> (254.6524, 7.62) projected
  circle A12 centre (228.9574, 5.3749) radius 3.175
  line L45 (48.9124, 7.62) -> (76.8524, 7.62) projected
  circle A13 centre (74.6073, 5.3749) radius 3.175
  circle A14 centre (51.1574, 5.3749) radius 3.175
  line L46 (115.7412, 106.9749) -> (115.7412, 83.5251) construction
  line L47 (115.7412, 83.5251) -> (124.7896, 83.5251) construction
  line L48 (124.7896, 83.5251) -> (124.7896, 106.9749) construction
  line L49 (124.7896, 106.9749) -> (115.7412, 106.9749) construction
  line L50 (113.4962, 109.22) -> (113.4962, 81.28) projected
  circle A15 centre (115.7412, 106.9749) radius 3.175
  circle A16 centre (124.7896, 106.9749) radius 3.175
  line L51 (127.0347, 81.28) -> (127.0347, 109.22) projected
  circle A17 centre (124.7896, 83.5251) radius 3.175
  circle A18 centre (115.7412, 83.5251) radius 3.175
  dimension "d59" = 6.35
  dimension "d60" = 6.35
extrude "Extrusion12" cut sketch "Sketch13" along normal through all both and the other way through all
sketch "Sketch14" plane through (80.0725, 184.15, 0) normal (0, 1, 0) x (1, 0, 0)
  line L0 (-76.4063, 0) -> (-80.0725, -6.35) projected
  line L1 (-80.0725, -6.35) -> (-79.3392, -6.35)
  line L2 (-80.0725, -6.35) -> (-31.1601, -6.35) construction
  line L3 (-79.3392, -6.35) -> (-75.6731, 0)
  line L4 (-76.4063, 0) -> (-31.1601, 0) construction
  line L5 (-75.6731, 0) -> (-76.4063, 0)
  line L6 (174.5799, -6.35) -> (223.4922, -6.35) construction
  line L7 (223.4922, -6.35) -> (222.759, -6.35)
  line L8 (222.759, -6.35) -> (219.0928, 0)
  line L9 (219.8261, 0) -> (177.8, 0) construction
  line L10 (219.0928, 0) -> (219.8261, 0)
  line L11 (223.4922, -6.35) -> (219.8261, 0) projected
  line L12 (219.8261, 0) -> (223.4922, -6.35)
  point P0 (-80.0725, 0)
  dimension "d63" = 0.635
  dimension "d64" = 0.635
extrude "Extrusion13" cut sketch "Sketch14" against normal through all
equation "\"d2\" = Panel_Thickness"
equation "\"d16\" = Panel_Thickness"
equation "\"d20\" = Panel_Thickness + Fit_Tolerance"
equation "\"d22\" = Panel_Thickness + Fit_Tolerance"
equation "\"d27\" = Panel_Thickness + Fit_Tolerance"
equation "\"d29\" = Panel_Thickness + Fit_Tolerance"
equation "\"d30\" = Panel_Thickness"
equation "\"d35\" = Panel_Thickness"
equation "\"d42\" = Panel_Thickness"
equation "\"d46\" = Panel_Thickness"
equation "\"d52\" = Panel_Thickness"
equation "\"d54\" = Fit_Tolerance"
equation "\"d55\" = Fit_Tolerance"
equation "\"d56\" = Fit_Tolerance"
equation "\"d57\" = Panel_Thickness"
equation "\"d59\" = Tool_Dia"
equation "\"d60\" = Tool_Dia"
equation "\"d63\" = 0.5 * Fit_Tolerance"
equation "\"d64\" = 0.5 * Fit_Tolerance"
equation "\"d65\" = Panel_Thickness"
equation "\"Panel_Thickness\" = 6.35"
equation "\"Fit_Tolerance\" = 1.27"
equation "\"Tool_Dia\" = 6.35"
properties part number "BA14" material "Wood (Cherry)"
